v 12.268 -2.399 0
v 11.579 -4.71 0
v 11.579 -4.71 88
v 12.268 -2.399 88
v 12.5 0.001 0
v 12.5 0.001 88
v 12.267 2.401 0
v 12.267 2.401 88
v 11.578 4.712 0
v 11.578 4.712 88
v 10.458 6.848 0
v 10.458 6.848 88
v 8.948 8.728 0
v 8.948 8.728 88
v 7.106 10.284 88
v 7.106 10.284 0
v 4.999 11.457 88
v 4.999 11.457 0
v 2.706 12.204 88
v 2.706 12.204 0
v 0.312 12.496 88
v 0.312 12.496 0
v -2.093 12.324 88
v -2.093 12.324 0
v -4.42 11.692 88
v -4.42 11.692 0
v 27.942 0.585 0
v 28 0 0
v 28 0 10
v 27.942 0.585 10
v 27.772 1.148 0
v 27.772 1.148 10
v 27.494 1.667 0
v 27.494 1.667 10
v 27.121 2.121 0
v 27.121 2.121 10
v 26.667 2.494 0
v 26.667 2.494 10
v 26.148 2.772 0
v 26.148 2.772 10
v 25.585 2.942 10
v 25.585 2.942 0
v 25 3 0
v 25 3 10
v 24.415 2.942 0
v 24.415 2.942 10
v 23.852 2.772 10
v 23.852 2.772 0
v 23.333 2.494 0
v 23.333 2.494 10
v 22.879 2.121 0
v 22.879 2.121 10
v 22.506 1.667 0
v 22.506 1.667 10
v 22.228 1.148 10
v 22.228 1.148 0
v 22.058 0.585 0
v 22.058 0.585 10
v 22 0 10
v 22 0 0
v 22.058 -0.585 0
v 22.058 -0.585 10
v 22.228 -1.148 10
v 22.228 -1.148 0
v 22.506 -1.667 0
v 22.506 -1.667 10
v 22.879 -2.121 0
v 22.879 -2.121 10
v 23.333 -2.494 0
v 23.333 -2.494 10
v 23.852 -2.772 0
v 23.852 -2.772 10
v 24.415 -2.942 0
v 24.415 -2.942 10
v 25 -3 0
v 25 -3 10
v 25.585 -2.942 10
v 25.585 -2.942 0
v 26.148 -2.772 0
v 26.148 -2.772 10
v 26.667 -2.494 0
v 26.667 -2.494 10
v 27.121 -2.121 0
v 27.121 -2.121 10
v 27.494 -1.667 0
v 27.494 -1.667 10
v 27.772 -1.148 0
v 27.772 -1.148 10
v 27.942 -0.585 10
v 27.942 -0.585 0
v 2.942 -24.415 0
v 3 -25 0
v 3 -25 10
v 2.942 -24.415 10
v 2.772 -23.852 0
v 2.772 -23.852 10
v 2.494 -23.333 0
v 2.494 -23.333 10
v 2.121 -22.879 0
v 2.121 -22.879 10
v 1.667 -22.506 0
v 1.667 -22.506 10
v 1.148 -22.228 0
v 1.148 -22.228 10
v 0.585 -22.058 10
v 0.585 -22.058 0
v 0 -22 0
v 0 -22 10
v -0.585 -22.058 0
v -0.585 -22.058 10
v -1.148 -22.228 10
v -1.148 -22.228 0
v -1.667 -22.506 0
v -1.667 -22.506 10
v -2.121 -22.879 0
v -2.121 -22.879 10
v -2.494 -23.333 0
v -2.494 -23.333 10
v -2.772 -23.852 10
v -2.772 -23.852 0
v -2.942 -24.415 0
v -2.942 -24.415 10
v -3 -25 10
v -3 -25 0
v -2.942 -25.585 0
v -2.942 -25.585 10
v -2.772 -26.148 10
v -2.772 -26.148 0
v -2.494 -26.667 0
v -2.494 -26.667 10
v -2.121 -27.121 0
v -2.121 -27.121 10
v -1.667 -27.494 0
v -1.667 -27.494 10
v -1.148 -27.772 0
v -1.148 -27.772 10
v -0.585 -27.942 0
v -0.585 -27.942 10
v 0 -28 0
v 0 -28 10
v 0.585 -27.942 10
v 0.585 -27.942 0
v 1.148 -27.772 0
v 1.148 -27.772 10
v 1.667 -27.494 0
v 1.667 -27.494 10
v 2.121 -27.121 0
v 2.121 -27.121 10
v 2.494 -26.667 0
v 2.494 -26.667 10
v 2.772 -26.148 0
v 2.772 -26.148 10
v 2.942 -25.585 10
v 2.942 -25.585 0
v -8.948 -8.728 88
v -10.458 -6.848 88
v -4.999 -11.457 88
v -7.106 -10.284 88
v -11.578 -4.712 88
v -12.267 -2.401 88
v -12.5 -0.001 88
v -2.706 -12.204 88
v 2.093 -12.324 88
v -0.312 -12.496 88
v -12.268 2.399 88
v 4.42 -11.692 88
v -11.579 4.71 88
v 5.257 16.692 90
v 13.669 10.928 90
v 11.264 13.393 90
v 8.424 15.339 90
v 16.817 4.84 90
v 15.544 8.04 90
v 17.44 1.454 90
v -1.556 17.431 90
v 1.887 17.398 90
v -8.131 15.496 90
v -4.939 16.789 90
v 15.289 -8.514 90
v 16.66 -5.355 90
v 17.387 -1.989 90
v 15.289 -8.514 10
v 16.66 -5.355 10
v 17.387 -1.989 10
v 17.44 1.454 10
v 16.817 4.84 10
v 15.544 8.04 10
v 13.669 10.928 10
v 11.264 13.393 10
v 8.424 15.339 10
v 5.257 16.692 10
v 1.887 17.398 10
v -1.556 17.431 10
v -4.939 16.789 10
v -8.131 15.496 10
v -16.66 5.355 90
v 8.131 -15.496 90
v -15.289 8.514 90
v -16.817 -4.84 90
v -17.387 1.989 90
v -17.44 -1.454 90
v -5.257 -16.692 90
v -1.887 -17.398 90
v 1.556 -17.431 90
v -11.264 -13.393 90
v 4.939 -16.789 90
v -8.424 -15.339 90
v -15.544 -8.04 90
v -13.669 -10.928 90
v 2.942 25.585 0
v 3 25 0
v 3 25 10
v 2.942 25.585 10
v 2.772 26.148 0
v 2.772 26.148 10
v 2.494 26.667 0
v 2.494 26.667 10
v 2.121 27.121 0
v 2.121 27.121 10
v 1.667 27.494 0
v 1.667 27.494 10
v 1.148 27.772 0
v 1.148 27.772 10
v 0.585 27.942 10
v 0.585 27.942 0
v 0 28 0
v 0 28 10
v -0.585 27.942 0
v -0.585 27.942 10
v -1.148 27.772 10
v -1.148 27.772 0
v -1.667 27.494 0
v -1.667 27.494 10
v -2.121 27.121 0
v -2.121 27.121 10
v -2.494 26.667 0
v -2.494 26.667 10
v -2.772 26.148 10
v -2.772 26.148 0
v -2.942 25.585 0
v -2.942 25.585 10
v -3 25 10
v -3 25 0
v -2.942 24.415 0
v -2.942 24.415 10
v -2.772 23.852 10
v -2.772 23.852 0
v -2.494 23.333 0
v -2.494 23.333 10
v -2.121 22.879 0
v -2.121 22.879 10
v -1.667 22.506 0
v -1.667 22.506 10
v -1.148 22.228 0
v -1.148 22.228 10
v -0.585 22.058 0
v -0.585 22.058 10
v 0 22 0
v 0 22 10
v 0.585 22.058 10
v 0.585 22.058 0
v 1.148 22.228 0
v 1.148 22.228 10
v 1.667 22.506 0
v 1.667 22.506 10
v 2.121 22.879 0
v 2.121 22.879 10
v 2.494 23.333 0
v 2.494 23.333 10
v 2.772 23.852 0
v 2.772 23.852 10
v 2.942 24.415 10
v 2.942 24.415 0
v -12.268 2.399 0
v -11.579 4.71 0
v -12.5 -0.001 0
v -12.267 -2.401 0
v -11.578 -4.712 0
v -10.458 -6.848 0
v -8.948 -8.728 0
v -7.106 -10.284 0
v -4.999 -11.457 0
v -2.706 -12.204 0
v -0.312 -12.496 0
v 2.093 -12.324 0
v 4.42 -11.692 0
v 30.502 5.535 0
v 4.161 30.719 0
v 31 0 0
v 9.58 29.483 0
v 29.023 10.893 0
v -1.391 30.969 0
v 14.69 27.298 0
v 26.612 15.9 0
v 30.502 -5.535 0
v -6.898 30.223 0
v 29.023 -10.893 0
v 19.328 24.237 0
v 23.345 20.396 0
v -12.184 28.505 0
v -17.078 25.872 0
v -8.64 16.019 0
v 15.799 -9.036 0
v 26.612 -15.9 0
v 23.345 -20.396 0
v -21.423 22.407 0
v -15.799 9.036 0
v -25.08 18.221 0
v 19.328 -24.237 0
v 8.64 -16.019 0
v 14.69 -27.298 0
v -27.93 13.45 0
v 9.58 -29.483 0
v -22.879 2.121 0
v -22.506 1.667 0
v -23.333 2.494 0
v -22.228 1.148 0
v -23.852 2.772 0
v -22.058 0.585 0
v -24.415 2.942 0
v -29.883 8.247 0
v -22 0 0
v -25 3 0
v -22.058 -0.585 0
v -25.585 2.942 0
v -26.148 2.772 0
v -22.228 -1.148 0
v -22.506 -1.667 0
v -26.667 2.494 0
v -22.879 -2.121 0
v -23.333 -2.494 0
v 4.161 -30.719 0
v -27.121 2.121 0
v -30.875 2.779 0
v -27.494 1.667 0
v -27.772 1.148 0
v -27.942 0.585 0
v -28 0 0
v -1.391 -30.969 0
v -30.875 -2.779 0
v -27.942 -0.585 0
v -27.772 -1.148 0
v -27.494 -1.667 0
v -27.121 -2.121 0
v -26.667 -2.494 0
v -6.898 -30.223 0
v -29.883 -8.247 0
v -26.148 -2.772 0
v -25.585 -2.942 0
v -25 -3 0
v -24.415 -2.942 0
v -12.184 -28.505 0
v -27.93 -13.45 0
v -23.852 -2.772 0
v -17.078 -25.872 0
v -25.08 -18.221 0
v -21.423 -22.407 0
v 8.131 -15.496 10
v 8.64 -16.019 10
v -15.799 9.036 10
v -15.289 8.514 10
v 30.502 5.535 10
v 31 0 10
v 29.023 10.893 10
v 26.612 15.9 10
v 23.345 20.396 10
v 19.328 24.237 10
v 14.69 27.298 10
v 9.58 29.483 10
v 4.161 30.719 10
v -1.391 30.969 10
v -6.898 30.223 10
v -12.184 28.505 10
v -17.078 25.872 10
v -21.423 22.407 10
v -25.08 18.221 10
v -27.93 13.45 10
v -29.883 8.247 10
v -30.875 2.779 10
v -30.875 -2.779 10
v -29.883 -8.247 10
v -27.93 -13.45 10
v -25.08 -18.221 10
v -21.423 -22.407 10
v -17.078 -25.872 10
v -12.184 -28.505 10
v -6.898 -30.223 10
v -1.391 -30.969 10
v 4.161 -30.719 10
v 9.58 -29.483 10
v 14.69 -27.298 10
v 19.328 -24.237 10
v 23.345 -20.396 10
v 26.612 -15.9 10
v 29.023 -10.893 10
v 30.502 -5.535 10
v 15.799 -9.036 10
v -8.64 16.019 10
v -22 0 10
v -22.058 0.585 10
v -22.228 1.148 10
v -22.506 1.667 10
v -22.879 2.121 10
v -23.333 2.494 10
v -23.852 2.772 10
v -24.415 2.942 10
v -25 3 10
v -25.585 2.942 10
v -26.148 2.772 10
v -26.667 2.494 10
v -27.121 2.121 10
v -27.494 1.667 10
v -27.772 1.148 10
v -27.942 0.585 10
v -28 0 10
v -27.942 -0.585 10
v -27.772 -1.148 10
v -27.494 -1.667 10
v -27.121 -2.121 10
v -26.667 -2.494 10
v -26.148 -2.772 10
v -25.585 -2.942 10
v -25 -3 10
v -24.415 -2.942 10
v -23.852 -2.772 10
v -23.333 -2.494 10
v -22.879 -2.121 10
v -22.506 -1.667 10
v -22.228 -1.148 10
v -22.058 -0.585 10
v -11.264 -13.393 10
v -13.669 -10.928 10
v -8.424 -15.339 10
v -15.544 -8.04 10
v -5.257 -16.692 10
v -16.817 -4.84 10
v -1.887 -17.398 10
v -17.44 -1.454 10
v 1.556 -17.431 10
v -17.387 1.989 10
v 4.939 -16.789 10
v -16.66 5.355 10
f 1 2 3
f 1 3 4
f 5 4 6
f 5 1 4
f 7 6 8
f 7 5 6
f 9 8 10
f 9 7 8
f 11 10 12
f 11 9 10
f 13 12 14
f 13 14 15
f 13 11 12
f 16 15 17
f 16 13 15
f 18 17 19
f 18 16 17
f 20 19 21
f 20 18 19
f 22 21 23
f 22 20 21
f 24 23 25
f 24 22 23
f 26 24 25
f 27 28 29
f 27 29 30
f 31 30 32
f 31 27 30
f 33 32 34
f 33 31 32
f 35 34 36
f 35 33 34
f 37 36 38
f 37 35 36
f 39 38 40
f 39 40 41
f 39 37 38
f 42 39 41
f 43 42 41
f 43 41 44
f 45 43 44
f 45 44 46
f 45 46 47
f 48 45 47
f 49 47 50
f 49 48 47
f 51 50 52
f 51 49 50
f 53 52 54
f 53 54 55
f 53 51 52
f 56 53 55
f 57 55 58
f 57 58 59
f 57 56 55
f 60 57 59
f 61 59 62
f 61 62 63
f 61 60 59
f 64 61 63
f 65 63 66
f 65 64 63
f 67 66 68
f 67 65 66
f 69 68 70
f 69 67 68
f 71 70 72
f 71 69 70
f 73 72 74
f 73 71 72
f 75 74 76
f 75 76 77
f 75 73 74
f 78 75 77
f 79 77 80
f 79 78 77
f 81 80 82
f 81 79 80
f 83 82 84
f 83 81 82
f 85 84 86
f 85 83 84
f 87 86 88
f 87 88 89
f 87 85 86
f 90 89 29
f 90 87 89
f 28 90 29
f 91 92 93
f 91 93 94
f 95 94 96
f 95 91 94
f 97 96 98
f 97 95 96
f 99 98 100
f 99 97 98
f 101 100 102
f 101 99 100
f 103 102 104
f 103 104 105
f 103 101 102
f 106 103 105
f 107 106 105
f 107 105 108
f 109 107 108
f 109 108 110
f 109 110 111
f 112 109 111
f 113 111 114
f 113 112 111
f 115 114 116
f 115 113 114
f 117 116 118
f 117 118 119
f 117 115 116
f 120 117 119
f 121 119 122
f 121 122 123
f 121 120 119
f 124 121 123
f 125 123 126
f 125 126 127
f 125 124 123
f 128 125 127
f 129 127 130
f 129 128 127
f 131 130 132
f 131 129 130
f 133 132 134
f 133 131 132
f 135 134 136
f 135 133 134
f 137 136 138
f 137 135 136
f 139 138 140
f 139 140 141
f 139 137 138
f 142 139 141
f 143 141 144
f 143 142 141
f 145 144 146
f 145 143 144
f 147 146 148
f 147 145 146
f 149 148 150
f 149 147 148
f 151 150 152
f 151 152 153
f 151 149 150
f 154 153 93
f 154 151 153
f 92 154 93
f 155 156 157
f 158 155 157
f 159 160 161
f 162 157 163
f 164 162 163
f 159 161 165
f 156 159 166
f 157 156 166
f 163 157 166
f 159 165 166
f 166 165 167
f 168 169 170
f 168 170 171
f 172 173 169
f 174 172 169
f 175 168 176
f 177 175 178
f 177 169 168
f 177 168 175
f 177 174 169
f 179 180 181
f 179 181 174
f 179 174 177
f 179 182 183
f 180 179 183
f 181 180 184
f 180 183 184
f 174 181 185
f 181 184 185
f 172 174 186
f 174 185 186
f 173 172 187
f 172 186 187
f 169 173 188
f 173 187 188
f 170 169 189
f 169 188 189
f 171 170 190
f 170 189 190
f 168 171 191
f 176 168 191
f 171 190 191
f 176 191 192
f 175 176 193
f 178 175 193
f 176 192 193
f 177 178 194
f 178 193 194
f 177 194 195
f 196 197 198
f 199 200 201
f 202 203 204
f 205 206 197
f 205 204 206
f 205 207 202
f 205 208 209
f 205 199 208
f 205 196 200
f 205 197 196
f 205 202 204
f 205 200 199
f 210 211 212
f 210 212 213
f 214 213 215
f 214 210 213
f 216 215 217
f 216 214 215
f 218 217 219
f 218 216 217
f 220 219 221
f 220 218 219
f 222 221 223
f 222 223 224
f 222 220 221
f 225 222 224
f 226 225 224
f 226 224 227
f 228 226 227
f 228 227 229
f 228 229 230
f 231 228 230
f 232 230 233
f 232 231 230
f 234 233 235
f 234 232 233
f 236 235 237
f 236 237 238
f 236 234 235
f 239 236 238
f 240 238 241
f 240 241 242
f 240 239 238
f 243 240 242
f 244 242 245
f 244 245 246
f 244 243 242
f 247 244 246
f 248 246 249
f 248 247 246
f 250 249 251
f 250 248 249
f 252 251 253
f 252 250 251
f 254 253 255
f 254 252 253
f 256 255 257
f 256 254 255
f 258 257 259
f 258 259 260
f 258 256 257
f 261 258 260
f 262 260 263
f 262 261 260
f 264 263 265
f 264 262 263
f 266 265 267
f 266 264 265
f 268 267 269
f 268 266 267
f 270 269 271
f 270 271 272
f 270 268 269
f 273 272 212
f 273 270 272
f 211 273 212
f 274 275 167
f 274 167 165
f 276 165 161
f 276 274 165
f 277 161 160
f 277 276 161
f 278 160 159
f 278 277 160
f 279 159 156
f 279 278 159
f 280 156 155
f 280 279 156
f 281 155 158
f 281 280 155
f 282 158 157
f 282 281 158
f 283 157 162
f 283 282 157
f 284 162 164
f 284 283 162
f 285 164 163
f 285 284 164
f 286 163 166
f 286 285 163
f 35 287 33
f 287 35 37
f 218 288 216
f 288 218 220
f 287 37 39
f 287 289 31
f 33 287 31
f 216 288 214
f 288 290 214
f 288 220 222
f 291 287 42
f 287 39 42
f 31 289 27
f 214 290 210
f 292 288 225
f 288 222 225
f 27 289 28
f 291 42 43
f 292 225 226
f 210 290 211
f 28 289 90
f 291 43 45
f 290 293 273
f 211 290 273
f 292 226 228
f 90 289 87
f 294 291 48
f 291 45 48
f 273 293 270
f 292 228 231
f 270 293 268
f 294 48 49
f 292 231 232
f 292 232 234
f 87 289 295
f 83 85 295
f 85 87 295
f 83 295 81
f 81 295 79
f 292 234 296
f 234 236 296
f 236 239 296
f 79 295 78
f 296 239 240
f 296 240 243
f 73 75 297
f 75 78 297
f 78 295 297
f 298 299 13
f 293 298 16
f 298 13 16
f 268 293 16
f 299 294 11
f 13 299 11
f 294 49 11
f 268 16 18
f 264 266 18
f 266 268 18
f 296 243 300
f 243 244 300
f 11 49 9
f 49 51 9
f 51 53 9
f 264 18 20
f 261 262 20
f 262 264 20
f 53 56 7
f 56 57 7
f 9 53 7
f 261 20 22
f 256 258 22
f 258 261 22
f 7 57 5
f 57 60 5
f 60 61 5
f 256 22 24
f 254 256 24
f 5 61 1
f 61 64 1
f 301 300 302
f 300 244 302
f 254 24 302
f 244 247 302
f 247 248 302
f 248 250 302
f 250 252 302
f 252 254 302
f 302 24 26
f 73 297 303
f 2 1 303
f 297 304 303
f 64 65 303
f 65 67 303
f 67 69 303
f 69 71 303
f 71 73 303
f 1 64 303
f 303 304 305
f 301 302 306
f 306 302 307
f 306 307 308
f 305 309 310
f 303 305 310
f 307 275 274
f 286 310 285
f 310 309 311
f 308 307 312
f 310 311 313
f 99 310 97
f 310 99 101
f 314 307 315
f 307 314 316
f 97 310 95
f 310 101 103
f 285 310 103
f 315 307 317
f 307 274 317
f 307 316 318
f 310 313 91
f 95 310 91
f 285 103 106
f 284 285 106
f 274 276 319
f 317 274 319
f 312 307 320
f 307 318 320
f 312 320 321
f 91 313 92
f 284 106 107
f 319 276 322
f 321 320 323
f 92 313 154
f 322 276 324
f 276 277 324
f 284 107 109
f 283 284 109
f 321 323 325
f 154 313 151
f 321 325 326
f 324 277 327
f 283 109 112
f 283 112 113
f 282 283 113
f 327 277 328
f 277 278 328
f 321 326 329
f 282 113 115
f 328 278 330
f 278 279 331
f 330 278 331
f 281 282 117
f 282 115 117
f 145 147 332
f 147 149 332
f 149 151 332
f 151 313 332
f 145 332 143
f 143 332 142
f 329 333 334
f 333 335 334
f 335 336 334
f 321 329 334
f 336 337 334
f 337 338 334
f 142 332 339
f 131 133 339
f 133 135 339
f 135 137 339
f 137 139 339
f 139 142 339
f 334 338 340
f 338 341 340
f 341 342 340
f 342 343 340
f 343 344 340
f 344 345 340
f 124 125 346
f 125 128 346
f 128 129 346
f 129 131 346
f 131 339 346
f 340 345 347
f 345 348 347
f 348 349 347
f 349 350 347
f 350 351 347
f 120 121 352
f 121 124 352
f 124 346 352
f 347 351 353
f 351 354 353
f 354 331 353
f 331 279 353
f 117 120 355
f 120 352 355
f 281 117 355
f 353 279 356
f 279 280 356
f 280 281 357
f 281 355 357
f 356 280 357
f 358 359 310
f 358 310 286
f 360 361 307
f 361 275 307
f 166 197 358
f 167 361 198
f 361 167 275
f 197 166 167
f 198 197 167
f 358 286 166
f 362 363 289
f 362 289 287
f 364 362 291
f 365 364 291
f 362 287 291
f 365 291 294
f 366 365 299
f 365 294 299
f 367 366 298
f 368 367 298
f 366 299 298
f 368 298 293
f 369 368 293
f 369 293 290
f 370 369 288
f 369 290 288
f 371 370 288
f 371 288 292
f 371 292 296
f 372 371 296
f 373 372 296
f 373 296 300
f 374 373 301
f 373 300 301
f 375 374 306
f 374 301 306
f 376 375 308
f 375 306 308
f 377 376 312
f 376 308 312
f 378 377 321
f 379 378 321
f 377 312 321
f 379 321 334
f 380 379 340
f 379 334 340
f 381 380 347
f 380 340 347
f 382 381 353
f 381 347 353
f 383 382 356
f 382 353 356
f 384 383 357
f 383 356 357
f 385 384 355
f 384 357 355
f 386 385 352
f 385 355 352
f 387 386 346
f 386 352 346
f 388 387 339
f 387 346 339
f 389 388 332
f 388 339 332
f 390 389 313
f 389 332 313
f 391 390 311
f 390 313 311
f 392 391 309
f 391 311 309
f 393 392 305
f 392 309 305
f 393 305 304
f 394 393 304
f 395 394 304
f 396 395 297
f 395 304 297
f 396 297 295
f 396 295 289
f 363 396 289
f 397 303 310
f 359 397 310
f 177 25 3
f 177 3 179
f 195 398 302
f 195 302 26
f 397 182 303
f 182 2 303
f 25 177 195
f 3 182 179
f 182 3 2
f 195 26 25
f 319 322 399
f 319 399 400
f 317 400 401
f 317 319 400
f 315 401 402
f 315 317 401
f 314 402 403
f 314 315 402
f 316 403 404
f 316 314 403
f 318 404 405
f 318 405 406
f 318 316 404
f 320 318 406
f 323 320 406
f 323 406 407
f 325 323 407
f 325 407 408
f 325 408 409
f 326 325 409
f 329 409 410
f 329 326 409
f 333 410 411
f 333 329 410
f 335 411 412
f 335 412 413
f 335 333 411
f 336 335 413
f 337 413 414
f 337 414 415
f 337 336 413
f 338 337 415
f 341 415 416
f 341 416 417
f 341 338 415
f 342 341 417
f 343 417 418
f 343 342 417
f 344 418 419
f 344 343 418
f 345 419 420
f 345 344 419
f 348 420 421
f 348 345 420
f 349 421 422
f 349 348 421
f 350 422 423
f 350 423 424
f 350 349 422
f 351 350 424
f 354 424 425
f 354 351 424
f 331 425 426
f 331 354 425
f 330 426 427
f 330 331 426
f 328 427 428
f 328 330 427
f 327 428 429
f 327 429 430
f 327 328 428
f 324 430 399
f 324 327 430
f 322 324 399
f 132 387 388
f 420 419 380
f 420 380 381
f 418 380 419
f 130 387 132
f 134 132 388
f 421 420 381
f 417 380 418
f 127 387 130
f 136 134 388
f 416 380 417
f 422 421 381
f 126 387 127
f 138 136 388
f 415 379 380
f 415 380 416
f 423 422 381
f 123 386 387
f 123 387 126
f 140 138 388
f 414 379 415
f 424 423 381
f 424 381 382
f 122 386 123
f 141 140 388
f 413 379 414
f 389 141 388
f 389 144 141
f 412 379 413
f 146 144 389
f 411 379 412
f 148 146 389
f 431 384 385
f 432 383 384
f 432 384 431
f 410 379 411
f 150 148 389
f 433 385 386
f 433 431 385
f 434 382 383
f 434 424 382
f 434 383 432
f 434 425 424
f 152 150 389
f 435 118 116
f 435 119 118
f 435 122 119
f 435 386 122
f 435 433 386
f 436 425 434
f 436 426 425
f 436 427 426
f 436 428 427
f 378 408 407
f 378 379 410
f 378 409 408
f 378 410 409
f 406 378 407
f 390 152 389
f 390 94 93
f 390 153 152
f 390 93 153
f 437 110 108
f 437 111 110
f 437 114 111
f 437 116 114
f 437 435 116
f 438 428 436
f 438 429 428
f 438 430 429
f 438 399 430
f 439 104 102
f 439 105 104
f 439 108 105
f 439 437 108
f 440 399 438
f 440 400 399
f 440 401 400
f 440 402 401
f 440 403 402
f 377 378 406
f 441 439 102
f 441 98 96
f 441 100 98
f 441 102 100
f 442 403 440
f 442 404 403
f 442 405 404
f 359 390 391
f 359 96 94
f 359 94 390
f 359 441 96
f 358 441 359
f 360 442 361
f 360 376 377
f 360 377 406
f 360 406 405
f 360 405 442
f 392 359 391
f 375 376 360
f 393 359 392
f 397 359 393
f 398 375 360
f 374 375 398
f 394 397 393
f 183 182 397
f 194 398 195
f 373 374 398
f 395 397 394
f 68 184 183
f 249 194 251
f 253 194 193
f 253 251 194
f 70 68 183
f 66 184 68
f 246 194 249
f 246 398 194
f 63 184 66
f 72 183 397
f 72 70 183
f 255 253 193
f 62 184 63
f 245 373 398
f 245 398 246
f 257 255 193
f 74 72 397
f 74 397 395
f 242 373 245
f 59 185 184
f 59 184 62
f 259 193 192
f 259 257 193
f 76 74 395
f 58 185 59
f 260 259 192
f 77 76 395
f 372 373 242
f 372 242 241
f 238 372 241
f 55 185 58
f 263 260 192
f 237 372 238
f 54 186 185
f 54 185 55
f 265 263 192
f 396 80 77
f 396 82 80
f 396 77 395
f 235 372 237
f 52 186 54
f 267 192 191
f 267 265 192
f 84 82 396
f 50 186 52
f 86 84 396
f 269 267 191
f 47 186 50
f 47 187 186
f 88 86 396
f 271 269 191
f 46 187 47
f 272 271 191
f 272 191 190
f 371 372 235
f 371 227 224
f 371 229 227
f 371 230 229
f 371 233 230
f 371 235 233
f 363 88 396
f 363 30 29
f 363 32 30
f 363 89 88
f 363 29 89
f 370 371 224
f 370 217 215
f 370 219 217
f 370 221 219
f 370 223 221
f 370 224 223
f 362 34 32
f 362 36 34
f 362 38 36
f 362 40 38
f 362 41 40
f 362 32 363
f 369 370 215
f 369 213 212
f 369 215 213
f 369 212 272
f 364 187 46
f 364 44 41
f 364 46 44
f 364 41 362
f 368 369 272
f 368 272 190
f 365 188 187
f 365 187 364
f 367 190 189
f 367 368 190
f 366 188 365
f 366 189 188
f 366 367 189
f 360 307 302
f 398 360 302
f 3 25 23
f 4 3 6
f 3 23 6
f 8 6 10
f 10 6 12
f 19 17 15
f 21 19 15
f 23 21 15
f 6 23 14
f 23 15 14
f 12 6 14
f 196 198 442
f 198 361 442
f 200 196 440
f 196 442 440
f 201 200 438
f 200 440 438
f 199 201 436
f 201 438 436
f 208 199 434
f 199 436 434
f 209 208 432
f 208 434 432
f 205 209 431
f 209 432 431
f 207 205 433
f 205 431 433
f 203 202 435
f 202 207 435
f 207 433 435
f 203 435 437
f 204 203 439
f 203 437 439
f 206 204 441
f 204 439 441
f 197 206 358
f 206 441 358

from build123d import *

# Parameters (mm, degrees)
SKETCH_5_R           = 31
EXTRUDE_4_DEPTH      = 10
SKETCH_6_R           = 3
CUT_EXTRUDE_5_DEPTH  = 10
SKETCH_8_R           = 17.5
EXTRUDE_5_DEPTH      = 90
SKETCH_4_R           = 12.5
CUT_EXTRUDE_6_DEPTH  = 88
CUT_EXTRUDE_10_DEPTH = 120


with BuildPart() as part:
    # Эскиз5 → Бобышка-Вытянуть4 (new body)
    with BuildSketch(Plane.XY):
        Circle(SKETCH_5_R)
    extrude(amount=EXTRUDE_4_DEPTH)

    # Эскиз6 → Вырез-Вытянуть5 (cut)
    with BuildSketch(Plane.XY):
        with Locations((0, -25)):
            Circle(SKETCH_6_R)
        with Locations((-25, 0)):
            Circle(SKETCH_6_R)
        with Locations((0, 25)):
            Circle(SKETCH_6_R)
        with Locations((25, 0)):
            Circle(SKETCH_6_R)
    extrude(amount=CUT_EXTRUDE_5_DEPTH, mode=Mode.SUBTRACT)

    # Эскиз8 → Бобышка-Вытянуть5 (add)
    with BuildSketch(Plane.XY):
        Circle(SKETCH_8_R)
    extrude(amount=EXTRUDE_5_DEPTH)

    # Эскиз4 → Вырез-Вытянуть6 (cut)
    with BuildSketch(Plane.XY):
        Circle(SKETCH_4_R)
    extrude(amount=CUT_EXTRUDE_6_DEPTH, mode=Mode.SUBTRACT)

    # Эскиз12 → Вырез-Вытянуть10 (cut)
    with BuildSketch(Plane.XY):
        Polygon((8.640186366, -16.018650991), (-15.798690834, 9.036114648), (-8.640186366, 16.018650991), (15.798690834, -9.036114648), align=None)
    extrude(amount=CUT_EXTRUDE_10_DEPTH, mode=Mode.SUBTRACT)


solid = part.part
